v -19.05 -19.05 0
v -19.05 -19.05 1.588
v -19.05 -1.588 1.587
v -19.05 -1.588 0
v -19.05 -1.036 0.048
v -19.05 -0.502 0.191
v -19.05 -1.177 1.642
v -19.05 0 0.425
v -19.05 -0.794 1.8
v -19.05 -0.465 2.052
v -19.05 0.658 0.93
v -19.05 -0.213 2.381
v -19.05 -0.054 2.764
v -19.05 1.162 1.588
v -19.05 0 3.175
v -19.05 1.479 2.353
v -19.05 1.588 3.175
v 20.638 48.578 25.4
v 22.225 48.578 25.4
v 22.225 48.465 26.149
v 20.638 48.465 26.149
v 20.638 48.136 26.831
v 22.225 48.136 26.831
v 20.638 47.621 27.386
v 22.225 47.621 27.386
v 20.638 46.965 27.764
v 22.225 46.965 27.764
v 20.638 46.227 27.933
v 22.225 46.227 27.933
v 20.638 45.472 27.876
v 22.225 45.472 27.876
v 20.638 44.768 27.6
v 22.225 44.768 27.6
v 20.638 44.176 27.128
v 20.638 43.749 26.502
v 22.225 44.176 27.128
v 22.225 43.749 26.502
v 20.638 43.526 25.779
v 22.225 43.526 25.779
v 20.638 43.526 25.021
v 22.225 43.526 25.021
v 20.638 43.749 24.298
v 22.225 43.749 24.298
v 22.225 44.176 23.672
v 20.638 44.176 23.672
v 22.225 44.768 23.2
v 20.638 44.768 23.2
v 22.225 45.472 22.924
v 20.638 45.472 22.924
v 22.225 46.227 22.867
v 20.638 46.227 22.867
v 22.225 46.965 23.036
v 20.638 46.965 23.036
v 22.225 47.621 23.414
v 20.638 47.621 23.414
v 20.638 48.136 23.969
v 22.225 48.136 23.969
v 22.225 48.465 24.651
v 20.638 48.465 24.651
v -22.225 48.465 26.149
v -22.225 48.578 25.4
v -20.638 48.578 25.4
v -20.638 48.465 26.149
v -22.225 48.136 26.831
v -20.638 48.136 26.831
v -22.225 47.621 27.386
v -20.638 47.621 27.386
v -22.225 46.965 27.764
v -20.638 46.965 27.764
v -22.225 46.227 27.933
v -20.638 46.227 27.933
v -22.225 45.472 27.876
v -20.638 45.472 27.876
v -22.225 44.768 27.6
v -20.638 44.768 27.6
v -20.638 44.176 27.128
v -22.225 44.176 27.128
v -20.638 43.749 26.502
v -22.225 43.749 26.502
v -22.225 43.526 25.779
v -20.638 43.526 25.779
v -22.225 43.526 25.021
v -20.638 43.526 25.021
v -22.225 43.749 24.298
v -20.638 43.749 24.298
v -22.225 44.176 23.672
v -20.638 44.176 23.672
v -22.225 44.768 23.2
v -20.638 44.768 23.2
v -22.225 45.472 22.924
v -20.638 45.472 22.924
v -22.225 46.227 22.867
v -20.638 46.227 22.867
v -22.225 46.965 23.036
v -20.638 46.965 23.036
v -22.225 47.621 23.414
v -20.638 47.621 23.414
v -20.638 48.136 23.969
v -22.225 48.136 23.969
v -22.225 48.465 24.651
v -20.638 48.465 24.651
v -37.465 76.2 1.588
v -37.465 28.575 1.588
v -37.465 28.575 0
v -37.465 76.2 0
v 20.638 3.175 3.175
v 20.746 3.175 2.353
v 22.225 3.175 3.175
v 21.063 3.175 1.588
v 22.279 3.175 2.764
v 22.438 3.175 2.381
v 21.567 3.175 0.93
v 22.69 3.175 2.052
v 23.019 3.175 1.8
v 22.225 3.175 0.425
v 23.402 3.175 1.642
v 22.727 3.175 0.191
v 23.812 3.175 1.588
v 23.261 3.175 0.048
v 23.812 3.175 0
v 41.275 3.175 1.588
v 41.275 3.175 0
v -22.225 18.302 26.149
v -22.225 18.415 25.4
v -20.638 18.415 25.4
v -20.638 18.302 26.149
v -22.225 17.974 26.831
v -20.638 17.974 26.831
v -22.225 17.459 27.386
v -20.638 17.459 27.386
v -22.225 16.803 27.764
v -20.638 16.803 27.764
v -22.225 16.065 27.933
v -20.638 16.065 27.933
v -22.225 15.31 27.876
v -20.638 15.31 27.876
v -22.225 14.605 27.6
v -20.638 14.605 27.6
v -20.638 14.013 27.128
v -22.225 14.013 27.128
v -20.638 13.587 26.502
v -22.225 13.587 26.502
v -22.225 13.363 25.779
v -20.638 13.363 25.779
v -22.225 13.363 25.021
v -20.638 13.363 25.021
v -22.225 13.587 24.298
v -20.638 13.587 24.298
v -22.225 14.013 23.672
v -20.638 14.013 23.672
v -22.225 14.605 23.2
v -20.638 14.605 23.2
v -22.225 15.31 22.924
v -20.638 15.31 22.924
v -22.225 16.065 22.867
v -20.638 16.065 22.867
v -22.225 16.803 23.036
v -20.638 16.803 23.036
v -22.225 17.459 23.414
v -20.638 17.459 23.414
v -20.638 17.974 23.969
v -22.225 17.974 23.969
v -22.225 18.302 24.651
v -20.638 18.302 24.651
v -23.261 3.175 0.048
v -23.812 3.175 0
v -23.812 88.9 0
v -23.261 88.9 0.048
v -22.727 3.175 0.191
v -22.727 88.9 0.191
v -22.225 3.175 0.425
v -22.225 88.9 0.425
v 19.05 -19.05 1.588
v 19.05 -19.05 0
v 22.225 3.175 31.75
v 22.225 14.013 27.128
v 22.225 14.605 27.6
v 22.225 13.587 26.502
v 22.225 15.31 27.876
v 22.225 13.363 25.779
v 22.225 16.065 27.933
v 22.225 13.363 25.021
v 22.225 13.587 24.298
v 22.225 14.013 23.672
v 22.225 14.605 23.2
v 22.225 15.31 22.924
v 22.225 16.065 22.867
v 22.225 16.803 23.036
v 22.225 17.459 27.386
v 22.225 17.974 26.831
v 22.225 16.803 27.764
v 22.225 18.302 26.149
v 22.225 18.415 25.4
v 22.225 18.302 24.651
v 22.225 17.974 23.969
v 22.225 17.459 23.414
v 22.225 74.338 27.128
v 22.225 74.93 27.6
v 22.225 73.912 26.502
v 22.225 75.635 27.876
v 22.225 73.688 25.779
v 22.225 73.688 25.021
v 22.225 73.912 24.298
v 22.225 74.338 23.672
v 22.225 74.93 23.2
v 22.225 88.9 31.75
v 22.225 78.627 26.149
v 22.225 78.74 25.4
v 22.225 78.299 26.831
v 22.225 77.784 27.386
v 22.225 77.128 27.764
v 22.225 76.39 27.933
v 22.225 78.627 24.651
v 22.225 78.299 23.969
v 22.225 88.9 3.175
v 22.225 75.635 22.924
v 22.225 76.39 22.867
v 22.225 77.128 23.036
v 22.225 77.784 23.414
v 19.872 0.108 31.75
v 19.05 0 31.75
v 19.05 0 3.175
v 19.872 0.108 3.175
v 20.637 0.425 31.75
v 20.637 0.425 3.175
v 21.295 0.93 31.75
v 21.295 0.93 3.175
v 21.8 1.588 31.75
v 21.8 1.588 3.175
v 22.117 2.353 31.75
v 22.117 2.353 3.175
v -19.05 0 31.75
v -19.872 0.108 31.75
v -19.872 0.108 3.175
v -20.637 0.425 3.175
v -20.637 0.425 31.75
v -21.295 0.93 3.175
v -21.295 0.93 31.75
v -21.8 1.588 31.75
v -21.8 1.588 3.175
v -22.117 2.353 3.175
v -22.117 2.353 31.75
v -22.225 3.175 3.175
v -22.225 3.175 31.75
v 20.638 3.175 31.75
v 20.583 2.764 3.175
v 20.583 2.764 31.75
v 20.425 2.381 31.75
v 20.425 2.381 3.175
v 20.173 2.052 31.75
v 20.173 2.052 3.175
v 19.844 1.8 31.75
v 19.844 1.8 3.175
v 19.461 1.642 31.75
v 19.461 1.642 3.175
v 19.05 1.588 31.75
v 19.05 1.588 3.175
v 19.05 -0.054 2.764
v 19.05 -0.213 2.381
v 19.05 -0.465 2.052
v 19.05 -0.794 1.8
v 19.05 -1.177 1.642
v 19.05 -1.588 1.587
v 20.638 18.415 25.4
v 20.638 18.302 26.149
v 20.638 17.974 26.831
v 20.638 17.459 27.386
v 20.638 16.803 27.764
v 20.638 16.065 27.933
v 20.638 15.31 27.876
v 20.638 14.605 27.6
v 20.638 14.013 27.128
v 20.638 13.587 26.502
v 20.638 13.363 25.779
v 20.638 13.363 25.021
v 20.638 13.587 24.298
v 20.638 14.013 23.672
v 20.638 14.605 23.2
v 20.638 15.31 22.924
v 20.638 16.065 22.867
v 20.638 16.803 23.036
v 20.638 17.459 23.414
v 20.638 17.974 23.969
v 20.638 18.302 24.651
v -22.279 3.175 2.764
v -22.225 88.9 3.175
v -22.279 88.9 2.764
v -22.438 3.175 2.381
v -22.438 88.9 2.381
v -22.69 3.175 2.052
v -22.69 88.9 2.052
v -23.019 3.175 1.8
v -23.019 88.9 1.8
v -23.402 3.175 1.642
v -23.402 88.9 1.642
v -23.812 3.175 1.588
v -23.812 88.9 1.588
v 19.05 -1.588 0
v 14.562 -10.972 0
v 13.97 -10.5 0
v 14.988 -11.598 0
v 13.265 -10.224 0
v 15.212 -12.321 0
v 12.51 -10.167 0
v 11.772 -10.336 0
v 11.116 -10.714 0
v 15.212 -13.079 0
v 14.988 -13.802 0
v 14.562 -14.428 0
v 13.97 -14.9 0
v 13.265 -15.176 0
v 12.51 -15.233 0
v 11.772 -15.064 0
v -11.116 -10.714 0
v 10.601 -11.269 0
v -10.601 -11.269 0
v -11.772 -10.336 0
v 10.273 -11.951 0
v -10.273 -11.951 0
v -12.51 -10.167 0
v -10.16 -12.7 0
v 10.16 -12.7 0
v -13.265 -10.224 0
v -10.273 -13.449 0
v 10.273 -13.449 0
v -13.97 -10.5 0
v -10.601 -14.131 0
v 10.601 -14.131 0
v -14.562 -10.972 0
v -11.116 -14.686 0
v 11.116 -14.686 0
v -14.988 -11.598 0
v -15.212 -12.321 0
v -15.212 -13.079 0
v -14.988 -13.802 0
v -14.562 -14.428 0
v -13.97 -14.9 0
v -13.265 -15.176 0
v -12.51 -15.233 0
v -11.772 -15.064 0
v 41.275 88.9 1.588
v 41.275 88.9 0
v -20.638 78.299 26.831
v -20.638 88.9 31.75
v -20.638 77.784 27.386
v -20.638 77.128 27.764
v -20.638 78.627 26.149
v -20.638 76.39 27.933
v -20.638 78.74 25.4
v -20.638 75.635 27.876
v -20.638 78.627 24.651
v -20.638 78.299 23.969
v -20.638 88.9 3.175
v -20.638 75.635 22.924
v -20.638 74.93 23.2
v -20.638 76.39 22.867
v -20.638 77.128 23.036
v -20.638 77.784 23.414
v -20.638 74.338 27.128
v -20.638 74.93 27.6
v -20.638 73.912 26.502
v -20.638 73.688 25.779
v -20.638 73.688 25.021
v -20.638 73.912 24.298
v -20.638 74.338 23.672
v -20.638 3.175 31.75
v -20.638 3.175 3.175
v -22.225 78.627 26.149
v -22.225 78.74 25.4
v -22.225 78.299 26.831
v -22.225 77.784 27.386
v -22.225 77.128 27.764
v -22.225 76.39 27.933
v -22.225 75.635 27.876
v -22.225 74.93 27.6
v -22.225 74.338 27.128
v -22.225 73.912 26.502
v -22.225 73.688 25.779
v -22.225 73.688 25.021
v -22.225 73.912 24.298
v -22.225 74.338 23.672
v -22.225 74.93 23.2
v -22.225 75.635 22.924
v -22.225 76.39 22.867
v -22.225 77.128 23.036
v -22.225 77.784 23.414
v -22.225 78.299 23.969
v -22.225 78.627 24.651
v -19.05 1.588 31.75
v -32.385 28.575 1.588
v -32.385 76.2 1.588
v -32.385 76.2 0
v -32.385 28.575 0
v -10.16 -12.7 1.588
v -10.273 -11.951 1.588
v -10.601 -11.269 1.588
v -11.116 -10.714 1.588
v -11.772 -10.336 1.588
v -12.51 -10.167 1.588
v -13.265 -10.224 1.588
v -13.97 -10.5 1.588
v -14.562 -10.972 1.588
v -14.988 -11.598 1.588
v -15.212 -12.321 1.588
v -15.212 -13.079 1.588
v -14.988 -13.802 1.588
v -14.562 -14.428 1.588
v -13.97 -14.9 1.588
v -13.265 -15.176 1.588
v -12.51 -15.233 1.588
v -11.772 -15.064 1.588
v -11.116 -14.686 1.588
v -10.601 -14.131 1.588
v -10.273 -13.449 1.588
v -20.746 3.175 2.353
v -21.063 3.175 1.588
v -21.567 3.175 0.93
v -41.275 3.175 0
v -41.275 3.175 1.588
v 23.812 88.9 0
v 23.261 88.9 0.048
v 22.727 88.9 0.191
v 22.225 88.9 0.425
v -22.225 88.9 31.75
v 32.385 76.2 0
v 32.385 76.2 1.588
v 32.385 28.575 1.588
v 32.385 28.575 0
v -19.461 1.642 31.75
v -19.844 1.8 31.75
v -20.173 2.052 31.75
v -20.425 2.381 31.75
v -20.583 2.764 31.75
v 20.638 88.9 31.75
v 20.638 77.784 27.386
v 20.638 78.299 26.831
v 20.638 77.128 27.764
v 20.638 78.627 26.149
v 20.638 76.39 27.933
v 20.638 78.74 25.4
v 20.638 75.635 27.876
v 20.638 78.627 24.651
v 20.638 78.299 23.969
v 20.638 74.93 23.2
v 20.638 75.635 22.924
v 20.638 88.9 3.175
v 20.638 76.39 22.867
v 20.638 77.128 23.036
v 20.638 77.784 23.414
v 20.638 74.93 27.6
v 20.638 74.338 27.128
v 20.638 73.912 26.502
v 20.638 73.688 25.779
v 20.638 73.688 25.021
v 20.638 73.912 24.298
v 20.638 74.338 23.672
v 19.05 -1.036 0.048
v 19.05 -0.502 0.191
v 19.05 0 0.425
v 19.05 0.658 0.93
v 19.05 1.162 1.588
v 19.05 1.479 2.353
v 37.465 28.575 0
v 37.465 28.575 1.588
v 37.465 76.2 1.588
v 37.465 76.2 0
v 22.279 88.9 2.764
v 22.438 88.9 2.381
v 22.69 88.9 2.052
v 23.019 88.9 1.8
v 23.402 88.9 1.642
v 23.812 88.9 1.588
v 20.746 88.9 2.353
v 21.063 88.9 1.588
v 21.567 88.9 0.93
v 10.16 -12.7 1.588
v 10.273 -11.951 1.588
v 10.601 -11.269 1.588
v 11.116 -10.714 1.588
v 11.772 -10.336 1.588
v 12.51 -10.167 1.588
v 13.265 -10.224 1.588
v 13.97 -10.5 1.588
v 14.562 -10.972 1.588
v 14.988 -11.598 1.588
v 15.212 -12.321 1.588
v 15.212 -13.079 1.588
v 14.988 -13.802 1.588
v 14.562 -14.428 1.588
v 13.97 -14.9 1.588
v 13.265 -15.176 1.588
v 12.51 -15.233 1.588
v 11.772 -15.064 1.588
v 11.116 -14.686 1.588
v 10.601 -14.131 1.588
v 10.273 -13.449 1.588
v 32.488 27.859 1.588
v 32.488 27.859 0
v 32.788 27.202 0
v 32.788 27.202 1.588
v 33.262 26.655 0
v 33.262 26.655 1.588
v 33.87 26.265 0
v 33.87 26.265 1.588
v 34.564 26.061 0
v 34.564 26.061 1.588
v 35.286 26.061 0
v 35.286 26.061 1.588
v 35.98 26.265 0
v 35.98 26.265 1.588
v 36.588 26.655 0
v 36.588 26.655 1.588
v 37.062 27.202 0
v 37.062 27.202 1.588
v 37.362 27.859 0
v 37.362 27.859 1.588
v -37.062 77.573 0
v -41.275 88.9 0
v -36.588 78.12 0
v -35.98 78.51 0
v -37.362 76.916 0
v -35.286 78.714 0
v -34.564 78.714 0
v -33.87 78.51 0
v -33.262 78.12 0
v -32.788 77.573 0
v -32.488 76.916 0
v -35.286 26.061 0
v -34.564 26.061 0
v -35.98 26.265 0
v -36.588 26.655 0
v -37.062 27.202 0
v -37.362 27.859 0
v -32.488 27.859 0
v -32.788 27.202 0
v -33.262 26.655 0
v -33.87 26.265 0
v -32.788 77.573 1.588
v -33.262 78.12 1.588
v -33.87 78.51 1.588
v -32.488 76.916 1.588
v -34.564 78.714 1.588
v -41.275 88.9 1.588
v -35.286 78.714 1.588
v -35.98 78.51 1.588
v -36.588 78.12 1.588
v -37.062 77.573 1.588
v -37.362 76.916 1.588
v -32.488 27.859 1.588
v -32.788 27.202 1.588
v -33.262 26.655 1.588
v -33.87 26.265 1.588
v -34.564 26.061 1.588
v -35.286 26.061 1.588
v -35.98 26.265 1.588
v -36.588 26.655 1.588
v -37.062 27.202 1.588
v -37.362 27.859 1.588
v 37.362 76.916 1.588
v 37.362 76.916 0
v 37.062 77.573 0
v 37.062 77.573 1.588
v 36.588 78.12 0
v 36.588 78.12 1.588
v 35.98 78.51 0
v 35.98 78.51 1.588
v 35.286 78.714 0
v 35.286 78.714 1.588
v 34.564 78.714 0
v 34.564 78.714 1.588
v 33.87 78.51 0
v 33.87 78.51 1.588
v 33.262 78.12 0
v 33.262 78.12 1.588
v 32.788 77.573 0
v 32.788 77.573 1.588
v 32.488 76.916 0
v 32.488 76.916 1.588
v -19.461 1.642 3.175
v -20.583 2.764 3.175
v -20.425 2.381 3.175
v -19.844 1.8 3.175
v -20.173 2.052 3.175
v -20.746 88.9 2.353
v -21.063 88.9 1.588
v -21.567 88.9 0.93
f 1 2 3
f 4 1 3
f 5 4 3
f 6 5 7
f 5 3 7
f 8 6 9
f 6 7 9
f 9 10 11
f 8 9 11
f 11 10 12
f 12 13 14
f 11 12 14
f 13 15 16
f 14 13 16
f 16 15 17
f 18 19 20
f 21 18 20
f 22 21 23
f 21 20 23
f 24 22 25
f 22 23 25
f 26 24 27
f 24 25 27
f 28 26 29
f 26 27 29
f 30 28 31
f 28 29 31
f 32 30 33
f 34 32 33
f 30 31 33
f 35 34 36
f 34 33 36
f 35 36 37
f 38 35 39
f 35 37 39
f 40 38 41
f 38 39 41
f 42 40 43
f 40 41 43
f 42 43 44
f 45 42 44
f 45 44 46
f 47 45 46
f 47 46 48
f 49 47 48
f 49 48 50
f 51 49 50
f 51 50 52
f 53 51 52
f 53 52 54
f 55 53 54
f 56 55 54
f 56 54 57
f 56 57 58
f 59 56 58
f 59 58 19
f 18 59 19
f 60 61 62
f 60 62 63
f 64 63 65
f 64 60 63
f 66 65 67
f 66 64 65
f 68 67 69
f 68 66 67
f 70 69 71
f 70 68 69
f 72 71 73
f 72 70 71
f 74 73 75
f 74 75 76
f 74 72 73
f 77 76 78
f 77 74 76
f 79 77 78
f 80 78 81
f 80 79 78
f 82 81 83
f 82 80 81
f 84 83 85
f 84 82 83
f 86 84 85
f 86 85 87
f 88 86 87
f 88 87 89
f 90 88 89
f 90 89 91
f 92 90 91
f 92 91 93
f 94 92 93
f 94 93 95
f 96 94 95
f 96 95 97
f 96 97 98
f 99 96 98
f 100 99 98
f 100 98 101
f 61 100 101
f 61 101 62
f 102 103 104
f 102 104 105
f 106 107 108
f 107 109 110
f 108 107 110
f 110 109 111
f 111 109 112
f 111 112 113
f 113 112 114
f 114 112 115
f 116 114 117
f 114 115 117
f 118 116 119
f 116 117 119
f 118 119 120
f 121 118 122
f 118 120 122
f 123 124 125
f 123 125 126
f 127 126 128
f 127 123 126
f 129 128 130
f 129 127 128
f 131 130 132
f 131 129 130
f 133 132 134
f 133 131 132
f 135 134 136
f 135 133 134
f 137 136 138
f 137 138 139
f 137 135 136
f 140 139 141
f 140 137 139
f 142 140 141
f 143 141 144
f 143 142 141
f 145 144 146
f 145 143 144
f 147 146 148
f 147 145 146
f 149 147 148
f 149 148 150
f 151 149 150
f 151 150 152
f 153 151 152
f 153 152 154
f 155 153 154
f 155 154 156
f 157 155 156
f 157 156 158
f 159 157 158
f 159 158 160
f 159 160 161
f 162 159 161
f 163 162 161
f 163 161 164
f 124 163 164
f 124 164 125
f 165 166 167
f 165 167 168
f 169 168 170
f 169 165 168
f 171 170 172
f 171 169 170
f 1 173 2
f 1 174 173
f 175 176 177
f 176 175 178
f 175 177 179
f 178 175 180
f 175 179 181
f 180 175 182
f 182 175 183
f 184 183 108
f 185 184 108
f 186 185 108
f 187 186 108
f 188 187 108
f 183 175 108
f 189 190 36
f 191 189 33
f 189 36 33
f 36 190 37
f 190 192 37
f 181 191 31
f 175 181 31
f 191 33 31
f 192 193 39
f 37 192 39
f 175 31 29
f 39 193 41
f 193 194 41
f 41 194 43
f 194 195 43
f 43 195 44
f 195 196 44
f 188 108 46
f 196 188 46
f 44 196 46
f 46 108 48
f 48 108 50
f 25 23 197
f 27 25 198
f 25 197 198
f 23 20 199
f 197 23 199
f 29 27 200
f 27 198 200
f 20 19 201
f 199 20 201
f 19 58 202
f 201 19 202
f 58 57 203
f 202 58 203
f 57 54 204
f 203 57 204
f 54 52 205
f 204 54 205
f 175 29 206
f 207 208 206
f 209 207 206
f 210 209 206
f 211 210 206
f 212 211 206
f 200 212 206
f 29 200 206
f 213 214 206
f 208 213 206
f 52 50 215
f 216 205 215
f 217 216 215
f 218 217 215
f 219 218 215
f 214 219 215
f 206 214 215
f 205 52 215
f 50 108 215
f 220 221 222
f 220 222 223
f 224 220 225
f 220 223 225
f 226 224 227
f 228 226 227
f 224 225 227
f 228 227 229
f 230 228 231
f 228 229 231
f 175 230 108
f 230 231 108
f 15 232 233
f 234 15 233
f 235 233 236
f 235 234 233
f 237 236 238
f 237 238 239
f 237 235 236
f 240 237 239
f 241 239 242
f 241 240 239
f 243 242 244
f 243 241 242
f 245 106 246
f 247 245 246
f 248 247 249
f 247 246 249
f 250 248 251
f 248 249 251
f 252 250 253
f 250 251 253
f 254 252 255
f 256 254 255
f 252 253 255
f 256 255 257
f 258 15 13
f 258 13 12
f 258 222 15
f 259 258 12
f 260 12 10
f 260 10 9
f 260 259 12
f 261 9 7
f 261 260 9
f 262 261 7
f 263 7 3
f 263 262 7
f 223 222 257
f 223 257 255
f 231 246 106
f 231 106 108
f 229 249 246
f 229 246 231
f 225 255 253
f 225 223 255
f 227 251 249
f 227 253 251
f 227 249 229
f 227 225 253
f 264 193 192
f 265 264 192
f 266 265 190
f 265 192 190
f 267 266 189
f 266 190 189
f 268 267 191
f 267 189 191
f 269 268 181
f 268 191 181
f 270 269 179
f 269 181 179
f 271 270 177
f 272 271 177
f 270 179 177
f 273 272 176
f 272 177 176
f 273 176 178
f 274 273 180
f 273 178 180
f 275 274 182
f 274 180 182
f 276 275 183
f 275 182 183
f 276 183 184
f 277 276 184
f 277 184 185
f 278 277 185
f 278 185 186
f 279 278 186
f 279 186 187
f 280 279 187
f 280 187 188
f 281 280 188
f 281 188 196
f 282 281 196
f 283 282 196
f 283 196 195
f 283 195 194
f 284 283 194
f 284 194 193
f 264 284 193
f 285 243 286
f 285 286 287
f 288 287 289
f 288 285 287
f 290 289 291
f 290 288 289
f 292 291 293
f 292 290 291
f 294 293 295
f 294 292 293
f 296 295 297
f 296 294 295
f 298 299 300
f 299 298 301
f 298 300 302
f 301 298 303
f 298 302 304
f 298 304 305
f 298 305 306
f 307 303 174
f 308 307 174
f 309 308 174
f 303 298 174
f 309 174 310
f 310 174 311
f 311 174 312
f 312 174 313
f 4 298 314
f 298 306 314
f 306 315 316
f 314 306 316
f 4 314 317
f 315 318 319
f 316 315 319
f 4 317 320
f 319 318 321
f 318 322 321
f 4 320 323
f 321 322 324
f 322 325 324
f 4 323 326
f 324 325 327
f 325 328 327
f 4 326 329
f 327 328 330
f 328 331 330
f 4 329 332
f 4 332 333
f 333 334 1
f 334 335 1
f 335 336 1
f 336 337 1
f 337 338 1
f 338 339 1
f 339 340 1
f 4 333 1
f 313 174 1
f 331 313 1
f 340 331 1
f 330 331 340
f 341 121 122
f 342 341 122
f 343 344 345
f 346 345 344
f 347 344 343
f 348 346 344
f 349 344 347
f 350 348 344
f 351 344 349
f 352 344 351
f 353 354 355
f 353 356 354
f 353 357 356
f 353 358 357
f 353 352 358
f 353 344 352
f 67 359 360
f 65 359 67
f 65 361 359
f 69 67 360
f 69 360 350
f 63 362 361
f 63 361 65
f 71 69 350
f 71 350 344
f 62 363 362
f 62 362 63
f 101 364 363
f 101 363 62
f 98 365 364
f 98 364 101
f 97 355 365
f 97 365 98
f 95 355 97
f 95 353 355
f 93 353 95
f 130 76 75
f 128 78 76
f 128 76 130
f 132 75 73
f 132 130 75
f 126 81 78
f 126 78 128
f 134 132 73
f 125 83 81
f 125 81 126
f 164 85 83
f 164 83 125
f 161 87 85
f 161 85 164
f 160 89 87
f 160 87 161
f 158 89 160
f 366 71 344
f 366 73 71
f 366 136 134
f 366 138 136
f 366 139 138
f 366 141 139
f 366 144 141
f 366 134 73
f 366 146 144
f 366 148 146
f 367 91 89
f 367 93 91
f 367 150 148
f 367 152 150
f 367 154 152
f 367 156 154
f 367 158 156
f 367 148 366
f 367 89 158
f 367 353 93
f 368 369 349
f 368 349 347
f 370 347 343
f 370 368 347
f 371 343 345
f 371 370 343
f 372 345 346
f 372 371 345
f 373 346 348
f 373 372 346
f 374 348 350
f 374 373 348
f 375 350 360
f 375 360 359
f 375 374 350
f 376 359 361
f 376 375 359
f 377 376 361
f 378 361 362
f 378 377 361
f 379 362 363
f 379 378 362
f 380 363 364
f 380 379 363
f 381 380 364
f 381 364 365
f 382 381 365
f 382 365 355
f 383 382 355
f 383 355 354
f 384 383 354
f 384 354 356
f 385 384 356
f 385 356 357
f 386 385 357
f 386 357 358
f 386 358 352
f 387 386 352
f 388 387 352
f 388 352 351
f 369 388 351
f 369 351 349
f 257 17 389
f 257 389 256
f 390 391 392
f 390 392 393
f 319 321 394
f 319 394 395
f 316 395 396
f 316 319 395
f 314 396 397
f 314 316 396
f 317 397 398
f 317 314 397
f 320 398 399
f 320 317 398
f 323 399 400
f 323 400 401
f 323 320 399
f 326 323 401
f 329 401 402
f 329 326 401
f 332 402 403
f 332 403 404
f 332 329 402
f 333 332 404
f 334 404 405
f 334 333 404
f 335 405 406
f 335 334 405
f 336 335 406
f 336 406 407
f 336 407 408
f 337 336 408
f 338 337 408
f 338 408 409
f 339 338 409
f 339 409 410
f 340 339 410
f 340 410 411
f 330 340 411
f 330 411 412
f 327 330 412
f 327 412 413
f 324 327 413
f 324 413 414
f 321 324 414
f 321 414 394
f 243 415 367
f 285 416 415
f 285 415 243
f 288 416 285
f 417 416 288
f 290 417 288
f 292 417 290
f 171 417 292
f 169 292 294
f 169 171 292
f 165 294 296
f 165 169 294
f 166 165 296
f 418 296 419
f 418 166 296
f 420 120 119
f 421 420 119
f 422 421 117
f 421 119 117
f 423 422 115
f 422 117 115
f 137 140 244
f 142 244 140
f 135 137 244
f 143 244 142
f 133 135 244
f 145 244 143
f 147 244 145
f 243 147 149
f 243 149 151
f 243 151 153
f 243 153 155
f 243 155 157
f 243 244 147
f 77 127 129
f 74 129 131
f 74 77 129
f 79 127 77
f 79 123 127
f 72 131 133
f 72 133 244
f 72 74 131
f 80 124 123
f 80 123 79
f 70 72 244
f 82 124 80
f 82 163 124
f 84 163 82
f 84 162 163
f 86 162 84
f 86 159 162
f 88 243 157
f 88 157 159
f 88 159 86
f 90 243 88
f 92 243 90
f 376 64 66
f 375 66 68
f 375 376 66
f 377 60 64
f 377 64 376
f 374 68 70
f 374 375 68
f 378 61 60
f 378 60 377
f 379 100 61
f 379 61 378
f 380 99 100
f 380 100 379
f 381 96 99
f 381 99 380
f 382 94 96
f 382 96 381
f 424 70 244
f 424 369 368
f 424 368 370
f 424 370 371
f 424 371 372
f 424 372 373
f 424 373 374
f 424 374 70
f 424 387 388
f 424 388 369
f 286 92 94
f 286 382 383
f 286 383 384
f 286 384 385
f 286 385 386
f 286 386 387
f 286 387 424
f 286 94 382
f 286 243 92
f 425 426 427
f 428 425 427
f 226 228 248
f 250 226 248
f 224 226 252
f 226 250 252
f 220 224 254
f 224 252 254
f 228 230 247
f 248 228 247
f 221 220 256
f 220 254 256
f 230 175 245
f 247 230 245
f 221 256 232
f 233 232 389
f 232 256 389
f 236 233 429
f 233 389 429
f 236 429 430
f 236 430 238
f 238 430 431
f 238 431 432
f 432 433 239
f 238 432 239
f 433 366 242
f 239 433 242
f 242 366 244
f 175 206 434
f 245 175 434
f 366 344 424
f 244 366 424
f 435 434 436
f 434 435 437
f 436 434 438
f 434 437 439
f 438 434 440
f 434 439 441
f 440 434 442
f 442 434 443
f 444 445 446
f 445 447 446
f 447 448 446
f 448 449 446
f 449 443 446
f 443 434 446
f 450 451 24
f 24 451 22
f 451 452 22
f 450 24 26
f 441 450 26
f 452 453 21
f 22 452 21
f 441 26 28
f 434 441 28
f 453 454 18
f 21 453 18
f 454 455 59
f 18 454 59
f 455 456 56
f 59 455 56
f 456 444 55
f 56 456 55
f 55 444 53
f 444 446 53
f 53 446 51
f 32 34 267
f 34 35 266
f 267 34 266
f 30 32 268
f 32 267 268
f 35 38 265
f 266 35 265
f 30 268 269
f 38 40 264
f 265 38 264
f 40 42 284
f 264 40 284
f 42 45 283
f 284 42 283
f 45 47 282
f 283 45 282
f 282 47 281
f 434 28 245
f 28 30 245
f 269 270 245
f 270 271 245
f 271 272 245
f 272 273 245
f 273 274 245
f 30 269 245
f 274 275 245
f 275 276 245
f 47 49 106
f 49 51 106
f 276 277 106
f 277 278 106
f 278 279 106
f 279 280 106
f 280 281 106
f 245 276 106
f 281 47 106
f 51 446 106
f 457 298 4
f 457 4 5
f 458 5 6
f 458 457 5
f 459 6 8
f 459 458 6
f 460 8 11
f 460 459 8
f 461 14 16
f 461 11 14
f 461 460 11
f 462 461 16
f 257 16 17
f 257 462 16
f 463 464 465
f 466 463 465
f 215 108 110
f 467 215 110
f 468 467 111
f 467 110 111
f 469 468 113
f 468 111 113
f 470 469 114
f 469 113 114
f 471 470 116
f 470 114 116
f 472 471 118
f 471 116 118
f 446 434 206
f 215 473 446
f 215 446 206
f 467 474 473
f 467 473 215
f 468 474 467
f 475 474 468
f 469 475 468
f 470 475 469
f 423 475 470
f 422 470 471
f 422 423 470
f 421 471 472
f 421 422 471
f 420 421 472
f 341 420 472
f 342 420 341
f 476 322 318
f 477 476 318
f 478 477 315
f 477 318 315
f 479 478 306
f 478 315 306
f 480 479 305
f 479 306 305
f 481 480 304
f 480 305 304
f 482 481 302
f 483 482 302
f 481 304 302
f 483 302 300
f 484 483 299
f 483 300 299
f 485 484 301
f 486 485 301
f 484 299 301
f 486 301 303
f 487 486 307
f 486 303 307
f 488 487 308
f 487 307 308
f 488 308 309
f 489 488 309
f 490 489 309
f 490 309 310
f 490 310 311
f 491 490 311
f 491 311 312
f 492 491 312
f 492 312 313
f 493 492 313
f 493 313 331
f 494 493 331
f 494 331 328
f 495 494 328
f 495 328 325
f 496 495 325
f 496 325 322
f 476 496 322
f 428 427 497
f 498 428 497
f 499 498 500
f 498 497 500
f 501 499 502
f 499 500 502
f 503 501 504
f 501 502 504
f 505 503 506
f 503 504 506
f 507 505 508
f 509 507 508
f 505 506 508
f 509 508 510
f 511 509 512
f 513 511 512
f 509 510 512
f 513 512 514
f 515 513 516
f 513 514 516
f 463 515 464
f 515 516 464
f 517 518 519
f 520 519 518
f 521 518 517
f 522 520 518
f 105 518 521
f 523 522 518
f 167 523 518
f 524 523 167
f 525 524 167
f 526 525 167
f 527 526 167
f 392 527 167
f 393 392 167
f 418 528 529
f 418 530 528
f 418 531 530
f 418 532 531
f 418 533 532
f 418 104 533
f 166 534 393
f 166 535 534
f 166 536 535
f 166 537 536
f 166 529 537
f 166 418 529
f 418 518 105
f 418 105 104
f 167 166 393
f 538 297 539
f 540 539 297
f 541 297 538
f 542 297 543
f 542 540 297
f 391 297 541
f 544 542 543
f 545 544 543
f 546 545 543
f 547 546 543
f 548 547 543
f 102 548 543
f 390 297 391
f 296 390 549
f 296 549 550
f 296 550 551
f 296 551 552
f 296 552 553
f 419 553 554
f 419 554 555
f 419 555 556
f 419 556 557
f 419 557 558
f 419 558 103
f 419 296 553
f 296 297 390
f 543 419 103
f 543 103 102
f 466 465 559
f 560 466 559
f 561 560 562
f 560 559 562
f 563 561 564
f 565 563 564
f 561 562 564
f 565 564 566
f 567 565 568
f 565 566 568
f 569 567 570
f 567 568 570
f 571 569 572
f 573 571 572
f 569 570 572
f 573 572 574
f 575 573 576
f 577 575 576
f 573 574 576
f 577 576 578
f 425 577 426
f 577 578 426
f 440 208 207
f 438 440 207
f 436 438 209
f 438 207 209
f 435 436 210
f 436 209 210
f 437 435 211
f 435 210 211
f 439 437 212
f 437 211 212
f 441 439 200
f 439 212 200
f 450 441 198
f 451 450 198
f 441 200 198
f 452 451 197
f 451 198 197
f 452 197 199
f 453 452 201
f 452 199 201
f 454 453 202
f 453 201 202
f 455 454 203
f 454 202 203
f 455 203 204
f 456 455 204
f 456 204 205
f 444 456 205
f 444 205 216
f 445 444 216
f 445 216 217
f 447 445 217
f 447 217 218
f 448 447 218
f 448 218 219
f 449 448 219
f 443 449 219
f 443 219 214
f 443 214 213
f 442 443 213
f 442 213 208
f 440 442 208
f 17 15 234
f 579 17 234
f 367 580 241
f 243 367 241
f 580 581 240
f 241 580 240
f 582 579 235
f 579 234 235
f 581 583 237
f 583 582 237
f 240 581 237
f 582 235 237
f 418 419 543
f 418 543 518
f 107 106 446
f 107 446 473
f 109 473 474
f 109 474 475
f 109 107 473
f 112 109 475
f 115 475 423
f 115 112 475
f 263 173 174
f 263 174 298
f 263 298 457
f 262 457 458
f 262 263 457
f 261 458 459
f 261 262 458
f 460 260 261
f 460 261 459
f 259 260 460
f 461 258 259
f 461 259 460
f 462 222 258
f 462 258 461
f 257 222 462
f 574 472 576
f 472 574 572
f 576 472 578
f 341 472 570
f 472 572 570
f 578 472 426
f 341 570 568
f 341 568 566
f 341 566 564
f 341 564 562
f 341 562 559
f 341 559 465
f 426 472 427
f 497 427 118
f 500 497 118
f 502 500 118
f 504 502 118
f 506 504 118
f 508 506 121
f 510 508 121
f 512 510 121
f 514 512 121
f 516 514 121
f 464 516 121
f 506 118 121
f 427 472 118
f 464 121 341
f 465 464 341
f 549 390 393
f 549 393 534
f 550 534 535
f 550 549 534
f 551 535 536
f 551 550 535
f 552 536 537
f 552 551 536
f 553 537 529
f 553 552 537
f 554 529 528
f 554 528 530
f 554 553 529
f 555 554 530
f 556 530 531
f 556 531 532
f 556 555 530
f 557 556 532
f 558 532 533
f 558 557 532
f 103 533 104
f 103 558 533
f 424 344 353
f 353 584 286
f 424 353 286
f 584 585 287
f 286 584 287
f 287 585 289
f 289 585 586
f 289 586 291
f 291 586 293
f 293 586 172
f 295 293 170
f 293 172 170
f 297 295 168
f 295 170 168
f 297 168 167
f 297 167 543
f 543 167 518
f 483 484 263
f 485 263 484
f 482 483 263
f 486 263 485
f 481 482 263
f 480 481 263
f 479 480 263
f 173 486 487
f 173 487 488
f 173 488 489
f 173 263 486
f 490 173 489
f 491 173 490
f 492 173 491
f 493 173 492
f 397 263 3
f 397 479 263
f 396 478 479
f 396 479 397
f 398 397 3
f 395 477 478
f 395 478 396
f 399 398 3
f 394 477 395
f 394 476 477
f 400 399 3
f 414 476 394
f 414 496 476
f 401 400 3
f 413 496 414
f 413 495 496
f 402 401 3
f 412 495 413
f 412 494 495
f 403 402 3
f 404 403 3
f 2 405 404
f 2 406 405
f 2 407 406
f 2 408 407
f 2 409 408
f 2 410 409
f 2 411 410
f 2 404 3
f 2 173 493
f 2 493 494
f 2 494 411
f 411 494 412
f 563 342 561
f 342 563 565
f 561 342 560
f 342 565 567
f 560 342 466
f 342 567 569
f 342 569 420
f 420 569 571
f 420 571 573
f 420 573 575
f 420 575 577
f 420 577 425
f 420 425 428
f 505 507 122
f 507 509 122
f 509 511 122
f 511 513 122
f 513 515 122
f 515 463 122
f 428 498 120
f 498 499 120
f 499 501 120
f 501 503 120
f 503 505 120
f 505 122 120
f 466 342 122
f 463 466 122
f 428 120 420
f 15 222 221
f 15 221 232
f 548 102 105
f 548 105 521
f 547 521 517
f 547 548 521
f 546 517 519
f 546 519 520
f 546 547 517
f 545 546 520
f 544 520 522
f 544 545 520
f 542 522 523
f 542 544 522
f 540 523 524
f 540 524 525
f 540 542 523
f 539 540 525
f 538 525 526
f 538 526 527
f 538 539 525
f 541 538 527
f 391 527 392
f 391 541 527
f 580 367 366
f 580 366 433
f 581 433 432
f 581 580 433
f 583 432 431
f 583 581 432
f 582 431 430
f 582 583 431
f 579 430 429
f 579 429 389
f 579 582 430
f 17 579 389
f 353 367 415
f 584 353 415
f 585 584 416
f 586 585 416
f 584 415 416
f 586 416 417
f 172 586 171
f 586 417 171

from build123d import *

# Parameters (mm, degrees)
BASE_FLANGE_DEPTH         = 31.75
MITER_FLANGE2_DEPTH       = 88.9
MITER_FLANGE2_2_DEPTH     = 3.175
MITER_START               = 3.175
MITER_FLANGE2_3_DEPTH     = 85.725
MITER_START_2             = -19.05
MITER_FLANGE2_4_OUTLINE_W = 19.05
MITER_FLANGE2_4_OUTLINE_H = 1.5875
MITER_FLANGE2_4_DEPTH     = 17.4625
MITER_FLANGE2_5_DEPTH     = 19.05
MITER_FLANGE2_6_DEPTH     = 19.05
CUT_EXTRUDE5_DEPTH        = 1.5875
CUT_EXTRUDE2_REACH        = 105.029
SKETCH5_R                 = 2.54
CUT_EXTRUDE4_REACH        = 107.049
SKETCH7_R                 = 2.54


with BuildPart() as part:
    # Base-Flange: sheet metal written as solids
    # Sketch1 → Base-Flange (new body)
    with BuildSketch(Plane.XY):
        with BuildLine():
            Line((0, 0), (19.05, 0))
            ThreePointArc((19.05, 0), (21.29506403, 0.92993597), (22.225, 3.175))
            Line((22.225, 3.175), (22.225, 88.9))
            Line((22.225, 88.9), (20.6375, 88.9))
            Line((20.6375, 88.9), (20.6375, 3.175))
            ThreePointArc((20.6375, 3.175), (20.172532015, 2.052467985), (19.05, 1.5875))
            Line((19.05, 1.5875), (0, 1.5875))
            Line((0, 1.5875), (0, 0))
        make_face()
    extrude(amount=BASE_FLANGE_DEPTH)

    # Miter Flange2: read off the stored shape, not the designer's step
    # Miter Flange2 outline → Miter Flange2 (cut)
    with BuildSketch(Plane(origin=(0, 0, 0), x_dir=(1, 0, 0), z_dir=(0, 1, 0))):
        with BuildLine():
            Line((22.225, 0), (19.05, 0))
            Line((19.05, 0), (19.05, -3.175))
            Line((19.05, -3.175), (20.6375, -3.175))
            ThreePointArc((20.6375, -3.175), (21.062869343, -1.5875), (22.225, -0.425369343))
            Line((22.225, -0.425369343), (22.225, 0))
        make_face()
    extrude(amount=MITER_FLANGE2_DEPTH, mode=Mode.SUBTRACT)

    # Miter Flange2 2 outline → Miter Flange2 2 (cut)
    with BuildSketch(Plane(origin=(0, 0, 0), x_dir=(1, 0, 0), z_dir=(0, 1, 0))):
        with BuildLine():
            Line((20.6375, -3.175), (22.225, -3.175))
            Line((22.225, -3.175), (22.225, -0.425369343))
            ThreePointArc((22.225, -0.425369343), (21.062869343, -1.5875), (20.6375, -3.175))
        make_face()
    extrude(amount=MITER_FLANGE2_2_DEPTH, mode=Mode.SUBTRACT)

    # Miter Flange2 3 outline → Miter Flange2 3 (add)
    with BuildSketch(Plane(origin=(0, 0, 0), x_dir=(1, 0, 0), z_dir=(0, 1, 0)).offset(MITER_START)):
        with BuildLine():
            Line((22.225, -0.425369343), (22.225, -3.175))
            ThreePointArc((22.225, -3.175), (22.689967985, -2.052467985), (23.8125, -1.5875))
            Line((23.8125, -1.5875), (41.275, -1.5875))
            Line((41.275, -1.5875), (41.275, 0))
            Line((41.275, 0), (23.8125, 0))
            ThreePointArc((23.8125, 0), (22.990749532, -0.108185502), (22.225, -0.425369343))
        make_face()
    extrude(amount=MITER_FLANGE2_3_DEPTH)

    # Miter Flange2 5 outline → Miter Flange2 5 (cut)
    with BuildSketch(Plane.YZ):
        with BuildLine():
            ThreePointArc((1.5875, 3.175), (1.162130657, 1.5875), (0, 0.425369343))
            Line((0, 0.425369343), (0, 0))
            Line((0, 0), (1.5875, 0))
            Line((1.5875, 0), (1.5875, 3.175))
        make_face()
    extrude(amount=MITER_FLANGE2_5_DEPTH, mode=Mode.SUBTRACT)



with BuildPart() as body_2:
    # Miter Flange2 4 outline → Miter Flange2 4 (new body)
    with BuildSketch(Plane(origin=(0, 0, 0), x_dir=(1, 0, 0), z_dir=(0, 1, 0)).offset(MITER_START_2)):
        with Locations((9.525, -0.79375)):
            Rectangle(MITER_FLANGE2_4_OUTLINE_W, MITER_FLANGE2_4_OUTLINE_H)
    extrude(amount=MITER_FLANGE2_4_DEPTH)


with BuildPart() as part_1:
    add(part.part)

    add(body_2.part)  # Miter Flange2 6 merges body 2
    # Miter Flange2 6 outline → Miter Flange2 6 (add)
    with BuildSketch(Plane.YZ):
        with BuildLine():
            Line((0, 0.425369343), (0, 3.175))
            ThreePointArc((0, 3.175), (-0.464967985, 2.052467985), (-1.5875, 1.5875))
            Line((-1.5875, 1.5875), (-1.5875, 0))
            ThreePointArc((-1.5875, 0), (-0.765749532, 0.108185502), (0, 0.425369343))
        make_face()
    extrude(amount=MITER_FLANGE2_6_DEPTH)

    # Sketch8 → Cut-Extrude5 (cut)
    with BuildSketch(Plane.XY.offset(1.5875)):
        with BuildLine():
            Line((32.385, 76.2), (32.385, 28.575))
            ThreePointArc((32.385, 28.575), (34.925, 26.035), (37.465, 28.575))
            Line((37.465, 28.575), (37.465, 76.2))
            ThreePointArc((37.465, 76.2), (34.925, 78.74), (32.385, 76.2))
        make_face()
    extrude(amount=-CUT_EXTRUDE5_DEPTH, mode=Mode.SUBTRACT)

    # Sketch5 → Cut-Extrude2 (cut, up to next)
    with BuildSketch(Plane(origin=(0, 0, 0), x_dir=(-1, 0, 0), z_dir=(0, 0, -1)), mode=Mode.PRIVATE) as cut_extrude2_sk1:
        with Locations((-12.7, -12.7)):
            Circle(SKETCH5_R)
    cut_extrude2_tool1 = extrude(cut_extrude2_sk1.sketch, amount=-CUT_EXTRUDE2_REACH, mode=Mode.PRIVATE) & part_1.part
    add(cut_extrude2_tool1.solids().sort_by_distance((12.7, -12.7, 0))[0], mode=Mode.SUBTRACT)

    # Sketch7 → Cut-Extrude4 (cut, up to next)
    with BuildSketch(Plane(origin=(22.225, -0.213353633, 50.991788494), x_dir=(0, 0, -1), z_dir=(1, 0, 0)), mode=Mode.PRIVATE) as cut_extrude4_sk1:
        with Locations(Location((25.591788494, 76.413353633, 0), (0, 0, 90))):
            Circle(SKETCH7_R)
    cut_extrude4_tool1 = extrude(cut_extrude4_sk1.sketch, amount=-CUT_EXTRUDE4_REACH, mode=Mode.PRIVATE) & part_1.part
    # Sketch7 → Cut-Extrude4 (cut, up to next)
    with BuildSketch(Plane(origin=(22.225, -0.213353633, 50.991788494), x_dir=(0, 0, -1), z_dir=(1, 0, 0)), mode=Mode.PRIVATE) as cut_extrude4_sk2:
        with Locations(Location((25.591788494, 46.250853633, 0), (0, 0, 90))):
            Circle(SKETCH7_R)
    cut_extrude4_tool2 = extrude(cut_extrude4_sk2.sketch, amount=-CUT_EXTRUDE4_REACH, mode=Mode.PRIVATE) & part_1.part
    # Sketch7 → Cut-Extrude4 (cut, up to next)
    with BuildSketch(Plane(origin=(22.225, -0.213353633, 50.991788494), x_dir=(0, 0, -1), z_dir=(1, 0, 0)), mode=Mode.PRIVATE) as cut_extrude4_sk3:
        with Locations(Location((25.591788494, 16.088353633, 0), (0, 0, 90))):
            Circle(SKETCH7_R)
    cut_extrude4_tool3 = extrude(cut_extrude4_sk3.sketch, amount=-CUT_EXTRUDE4_REACH, mode=Mode.PRIVATE) & part_1.part
    add(cut_extrude4_tool1.solids().sort_by_distance((22.225, 76.2, 25.4))[0], mode=Mode.SUBTRACT)
    add(cut_extrude4_tool2.solids().sort_by_distance((22.225, 46.0375, 25.4))[0], mode=Mode.SUBTRACT)
    add(cut_extrude4_tool3.solids().sort_by_distance((22.225, 15.875, 25.4))[0], mode=Mode.SUBTRACT)

    # SHM-Mirror1: part across plane


with BuildPart() as part_2:
    add(part_1.part)
    add(part_1.part.mirror(Plane(origin=(0, 0, 31.75), x_dir=(0, 0, 1), z_dir=(-1, 0, 0))))


solid = part_2.part
